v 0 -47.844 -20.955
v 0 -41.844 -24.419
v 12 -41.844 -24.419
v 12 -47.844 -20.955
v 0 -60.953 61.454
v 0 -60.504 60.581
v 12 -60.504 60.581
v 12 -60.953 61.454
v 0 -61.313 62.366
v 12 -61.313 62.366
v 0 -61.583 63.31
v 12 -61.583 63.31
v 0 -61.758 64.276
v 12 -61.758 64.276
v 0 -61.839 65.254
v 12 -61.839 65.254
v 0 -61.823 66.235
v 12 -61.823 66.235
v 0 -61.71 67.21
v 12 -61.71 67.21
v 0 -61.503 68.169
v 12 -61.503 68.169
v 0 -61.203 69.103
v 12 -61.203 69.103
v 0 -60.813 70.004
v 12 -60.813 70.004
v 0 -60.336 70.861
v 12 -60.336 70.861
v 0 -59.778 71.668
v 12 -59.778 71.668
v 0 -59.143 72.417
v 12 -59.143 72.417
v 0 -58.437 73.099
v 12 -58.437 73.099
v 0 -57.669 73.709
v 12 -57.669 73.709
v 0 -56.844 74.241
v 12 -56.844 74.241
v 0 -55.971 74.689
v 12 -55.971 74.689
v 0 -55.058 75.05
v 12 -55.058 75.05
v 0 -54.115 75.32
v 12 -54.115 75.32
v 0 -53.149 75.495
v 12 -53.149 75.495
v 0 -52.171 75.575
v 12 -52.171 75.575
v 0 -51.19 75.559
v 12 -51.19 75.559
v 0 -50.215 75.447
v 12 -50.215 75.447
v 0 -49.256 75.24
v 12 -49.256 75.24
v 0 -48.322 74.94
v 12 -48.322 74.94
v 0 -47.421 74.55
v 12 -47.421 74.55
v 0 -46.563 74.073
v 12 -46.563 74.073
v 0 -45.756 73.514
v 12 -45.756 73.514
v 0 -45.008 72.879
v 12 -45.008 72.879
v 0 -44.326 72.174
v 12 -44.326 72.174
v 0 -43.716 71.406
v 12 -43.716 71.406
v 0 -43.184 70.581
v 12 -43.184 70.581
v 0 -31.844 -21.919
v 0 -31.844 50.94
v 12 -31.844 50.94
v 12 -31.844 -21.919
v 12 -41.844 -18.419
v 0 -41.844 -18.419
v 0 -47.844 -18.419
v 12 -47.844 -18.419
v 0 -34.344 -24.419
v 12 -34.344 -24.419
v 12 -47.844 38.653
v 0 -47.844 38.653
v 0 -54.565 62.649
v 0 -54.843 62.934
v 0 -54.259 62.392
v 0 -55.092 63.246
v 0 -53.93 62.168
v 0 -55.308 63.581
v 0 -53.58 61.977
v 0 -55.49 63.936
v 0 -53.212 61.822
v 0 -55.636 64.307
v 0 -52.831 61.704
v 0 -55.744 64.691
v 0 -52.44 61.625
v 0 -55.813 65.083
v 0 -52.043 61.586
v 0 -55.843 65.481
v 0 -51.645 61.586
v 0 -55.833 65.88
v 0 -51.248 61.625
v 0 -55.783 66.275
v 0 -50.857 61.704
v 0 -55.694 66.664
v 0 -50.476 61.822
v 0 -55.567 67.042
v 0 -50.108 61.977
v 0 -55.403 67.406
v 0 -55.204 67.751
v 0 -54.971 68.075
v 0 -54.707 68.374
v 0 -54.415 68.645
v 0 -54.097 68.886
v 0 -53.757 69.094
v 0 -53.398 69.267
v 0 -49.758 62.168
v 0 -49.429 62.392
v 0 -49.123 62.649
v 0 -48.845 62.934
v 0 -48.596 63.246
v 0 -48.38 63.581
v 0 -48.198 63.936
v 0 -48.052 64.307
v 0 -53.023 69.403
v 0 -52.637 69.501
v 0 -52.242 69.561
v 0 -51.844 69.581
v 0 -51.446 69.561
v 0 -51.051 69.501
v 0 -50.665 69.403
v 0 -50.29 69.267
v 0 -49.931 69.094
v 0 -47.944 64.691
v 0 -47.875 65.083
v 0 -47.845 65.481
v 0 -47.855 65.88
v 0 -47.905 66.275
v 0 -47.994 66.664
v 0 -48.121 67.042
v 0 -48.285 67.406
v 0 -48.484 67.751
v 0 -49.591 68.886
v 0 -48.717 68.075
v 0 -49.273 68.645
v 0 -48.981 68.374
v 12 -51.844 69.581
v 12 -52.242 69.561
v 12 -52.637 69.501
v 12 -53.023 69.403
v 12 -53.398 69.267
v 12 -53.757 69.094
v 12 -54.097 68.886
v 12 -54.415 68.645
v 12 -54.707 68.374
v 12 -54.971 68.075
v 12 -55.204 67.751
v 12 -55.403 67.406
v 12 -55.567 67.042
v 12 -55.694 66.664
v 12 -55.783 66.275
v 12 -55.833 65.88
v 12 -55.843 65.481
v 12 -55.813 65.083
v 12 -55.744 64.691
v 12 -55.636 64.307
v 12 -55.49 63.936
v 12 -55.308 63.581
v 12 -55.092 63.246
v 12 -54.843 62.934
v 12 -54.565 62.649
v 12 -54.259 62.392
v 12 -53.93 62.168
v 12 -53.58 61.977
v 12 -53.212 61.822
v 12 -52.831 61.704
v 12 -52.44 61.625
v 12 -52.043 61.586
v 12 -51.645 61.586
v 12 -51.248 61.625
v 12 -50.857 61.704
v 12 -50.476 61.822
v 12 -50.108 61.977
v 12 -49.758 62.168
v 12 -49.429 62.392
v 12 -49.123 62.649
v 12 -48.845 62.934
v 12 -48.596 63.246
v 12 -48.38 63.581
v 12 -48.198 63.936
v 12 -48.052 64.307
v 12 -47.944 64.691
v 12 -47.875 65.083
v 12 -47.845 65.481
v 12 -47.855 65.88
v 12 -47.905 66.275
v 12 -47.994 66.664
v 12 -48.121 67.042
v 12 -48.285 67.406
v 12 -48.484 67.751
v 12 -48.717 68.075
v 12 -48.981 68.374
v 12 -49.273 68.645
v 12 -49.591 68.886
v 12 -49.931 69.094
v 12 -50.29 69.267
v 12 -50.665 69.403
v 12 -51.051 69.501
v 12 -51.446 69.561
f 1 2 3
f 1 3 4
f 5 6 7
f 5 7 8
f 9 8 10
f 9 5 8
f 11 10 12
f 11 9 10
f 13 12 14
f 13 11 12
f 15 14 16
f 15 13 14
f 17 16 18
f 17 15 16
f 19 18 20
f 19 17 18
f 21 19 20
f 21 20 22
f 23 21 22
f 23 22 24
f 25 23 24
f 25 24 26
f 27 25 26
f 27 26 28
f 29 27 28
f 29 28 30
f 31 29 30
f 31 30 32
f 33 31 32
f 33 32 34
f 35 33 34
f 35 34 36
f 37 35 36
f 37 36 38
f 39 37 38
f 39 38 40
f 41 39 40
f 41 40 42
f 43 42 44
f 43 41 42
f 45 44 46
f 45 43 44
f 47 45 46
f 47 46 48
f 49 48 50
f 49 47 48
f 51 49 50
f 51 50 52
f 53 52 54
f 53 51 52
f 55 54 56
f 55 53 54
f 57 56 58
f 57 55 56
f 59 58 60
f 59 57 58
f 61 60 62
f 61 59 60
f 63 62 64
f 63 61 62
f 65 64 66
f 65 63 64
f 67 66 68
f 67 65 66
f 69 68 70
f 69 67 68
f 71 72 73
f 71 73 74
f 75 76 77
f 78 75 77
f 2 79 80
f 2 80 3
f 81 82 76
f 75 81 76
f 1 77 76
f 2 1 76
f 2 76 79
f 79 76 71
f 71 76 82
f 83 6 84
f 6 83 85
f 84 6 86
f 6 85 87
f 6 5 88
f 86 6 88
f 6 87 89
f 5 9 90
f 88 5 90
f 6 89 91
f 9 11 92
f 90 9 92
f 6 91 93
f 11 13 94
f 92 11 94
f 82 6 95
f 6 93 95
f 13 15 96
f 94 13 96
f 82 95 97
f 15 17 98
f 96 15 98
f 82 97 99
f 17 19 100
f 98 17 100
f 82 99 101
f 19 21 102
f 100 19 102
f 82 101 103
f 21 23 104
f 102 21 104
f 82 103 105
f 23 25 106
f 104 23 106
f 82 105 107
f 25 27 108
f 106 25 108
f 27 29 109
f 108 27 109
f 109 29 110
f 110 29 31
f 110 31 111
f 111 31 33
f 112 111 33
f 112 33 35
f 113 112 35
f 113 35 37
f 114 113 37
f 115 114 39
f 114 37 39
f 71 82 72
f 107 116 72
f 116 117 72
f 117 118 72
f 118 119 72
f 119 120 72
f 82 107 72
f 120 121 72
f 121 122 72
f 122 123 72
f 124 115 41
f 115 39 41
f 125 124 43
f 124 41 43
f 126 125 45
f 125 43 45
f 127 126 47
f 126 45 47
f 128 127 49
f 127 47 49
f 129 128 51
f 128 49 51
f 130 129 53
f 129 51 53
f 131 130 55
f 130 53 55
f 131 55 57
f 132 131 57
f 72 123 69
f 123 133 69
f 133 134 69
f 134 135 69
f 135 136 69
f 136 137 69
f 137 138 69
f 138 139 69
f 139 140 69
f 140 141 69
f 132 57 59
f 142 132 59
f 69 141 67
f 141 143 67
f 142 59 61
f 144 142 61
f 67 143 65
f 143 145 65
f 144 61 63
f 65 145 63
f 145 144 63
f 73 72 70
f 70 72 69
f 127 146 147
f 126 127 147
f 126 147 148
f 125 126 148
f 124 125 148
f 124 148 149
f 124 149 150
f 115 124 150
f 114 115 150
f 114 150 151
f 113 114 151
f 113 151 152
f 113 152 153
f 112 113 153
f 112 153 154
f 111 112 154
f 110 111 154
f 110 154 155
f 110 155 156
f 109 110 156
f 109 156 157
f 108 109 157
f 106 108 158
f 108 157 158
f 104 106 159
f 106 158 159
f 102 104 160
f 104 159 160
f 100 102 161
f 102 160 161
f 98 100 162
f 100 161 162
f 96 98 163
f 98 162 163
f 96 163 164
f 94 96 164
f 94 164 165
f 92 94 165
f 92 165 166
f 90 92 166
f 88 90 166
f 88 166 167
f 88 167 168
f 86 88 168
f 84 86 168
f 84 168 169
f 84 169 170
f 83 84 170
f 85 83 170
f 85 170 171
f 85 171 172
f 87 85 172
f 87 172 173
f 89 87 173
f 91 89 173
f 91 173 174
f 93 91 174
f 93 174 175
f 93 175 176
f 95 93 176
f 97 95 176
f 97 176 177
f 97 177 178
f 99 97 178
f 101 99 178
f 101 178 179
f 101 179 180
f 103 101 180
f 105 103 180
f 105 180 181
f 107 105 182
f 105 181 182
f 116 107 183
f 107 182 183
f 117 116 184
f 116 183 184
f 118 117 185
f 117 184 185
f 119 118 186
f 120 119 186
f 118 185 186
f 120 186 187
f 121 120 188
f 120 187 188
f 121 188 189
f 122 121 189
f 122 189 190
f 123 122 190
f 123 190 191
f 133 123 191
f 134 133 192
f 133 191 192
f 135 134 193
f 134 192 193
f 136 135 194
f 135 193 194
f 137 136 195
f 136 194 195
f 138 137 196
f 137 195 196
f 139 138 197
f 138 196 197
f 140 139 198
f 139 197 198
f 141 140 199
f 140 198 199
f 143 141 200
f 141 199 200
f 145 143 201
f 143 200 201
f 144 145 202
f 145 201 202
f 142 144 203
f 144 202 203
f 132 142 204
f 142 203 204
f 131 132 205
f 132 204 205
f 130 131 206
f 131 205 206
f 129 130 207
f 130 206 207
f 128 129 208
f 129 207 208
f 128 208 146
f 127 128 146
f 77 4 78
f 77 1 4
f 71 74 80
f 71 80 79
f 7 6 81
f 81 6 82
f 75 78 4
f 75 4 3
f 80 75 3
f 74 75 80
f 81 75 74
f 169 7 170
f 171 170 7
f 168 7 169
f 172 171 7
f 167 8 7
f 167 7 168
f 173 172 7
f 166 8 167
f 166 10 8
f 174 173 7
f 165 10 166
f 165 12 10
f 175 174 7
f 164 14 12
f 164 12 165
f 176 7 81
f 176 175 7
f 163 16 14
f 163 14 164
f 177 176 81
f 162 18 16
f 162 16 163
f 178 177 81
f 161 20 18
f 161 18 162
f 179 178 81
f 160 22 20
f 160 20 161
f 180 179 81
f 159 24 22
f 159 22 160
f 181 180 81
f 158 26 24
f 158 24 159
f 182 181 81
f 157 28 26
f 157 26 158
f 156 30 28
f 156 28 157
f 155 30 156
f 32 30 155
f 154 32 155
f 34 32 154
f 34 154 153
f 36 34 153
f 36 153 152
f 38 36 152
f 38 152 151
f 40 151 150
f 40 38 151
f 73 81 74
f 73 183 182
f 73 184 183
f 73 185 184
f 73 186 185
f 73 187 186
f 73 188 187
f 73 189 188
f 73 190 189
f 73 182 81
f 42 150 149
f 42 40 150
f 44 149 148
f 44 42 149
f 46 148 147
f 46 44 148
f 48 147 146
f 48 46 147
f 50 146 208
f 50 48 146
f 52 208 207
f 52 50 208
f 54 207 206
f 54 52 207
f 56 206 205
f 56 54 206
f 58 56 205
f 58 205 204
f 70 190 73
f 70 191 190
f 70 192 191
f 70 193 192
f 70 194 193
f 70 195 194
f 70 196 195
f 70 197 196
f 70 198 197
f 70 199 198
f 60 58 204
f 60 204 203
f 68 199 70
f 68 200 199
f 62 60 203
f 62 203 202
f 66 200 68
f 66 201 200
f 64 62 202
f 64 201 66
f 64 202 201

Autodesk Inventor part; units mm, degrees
ref_plane "YZ Plane" through (0, 0, 0) normal (1, 0, 0) x (0, 1, 0)
ref_plane "XZ Plane" through (0, 0, 0) normal (0, 1, 0) x (-1, 0, 0)
ref_plane "XY Plane" through (0, 0, 0) normal (0, 0, 1) x (1, 0, 0)
sketch "Skizze1" plane through (0, 0, 0) normal (1, 0, 0) x (0, 1, 0)
  line L0 (-88.8183, 0) -> (21.3265, 0) projected
  line L1 (0, -72.4192) -> (0, 123.5808) projected
  line L2 (-61.844, -44.4192) -> (-61.844, 95.5808)
  line L3 (-31.844, 50.9398) -> (-31.844, -24.4192)
  line L4 (-41.844, -18.4192) -> (-47.844, -18.4192)
  line L5 (-41.844, -24.4192) -> (-47.844, -20.9551)
  line L6 (-41.844, -24.4192) -> (-34.9129, -24.4192) construction
  line L7 (-31.844, 50.9398) -> (-43.1838, 70.5808)
  line L8 (-31.844, 50.9398) -> (-5.6477, 50.9398) construction
  circle A0 centre (-51.844, 65.5808) radius 10
  line L9 (-60.5043, 60.5808) -> (-47.844, 38.6526)
  line L10 (-61.844, 62.7769) -> (-45.1591, 62.7769) construction
  line L11 (-47.844, 38.6526) -> (-41.844, -18.4192)
  line L12 (-31.844, -24.4192) -> (-41.844, -24.4192)
  line L13 (-47.844, -20.9551) -> (-47.844, -18.4192)
  line L14 (-73.0833, 75.5808) -> (5.5916, 75.5808)
  point P0 (0, 0)
  point P1 (-61.844, 75.5808)
  point P2 (-37.5139, 60.7603)
  dimension "d0" = 150
  dimension "d1" = 120
  dimension "d2" = 60
  dimension "d3" = 6
  dimension "d4" = 16
  dimension "d5" = 10
  dimension "d6" = 20
  dimension "d7" = 30
  dimension "d8" = 16
extrude "Extrusion1" add sketch "Skizze1" along normal blind 12 contours L11 L9 A0 L7 L3 L0 | L0 L3 L12 L5 L13 L4 L11 | A0
hole "Bohrung1" at (0, -51.844, 65.5808) direction (1, 0, 0) diameter 8 end through all
chamfer "Fasen1" distance 2.5 angle 45 1 edges at (6, -31.844, -24.4192) measured on face at (4, -38.5107, -24.4192)
properties part number "Abzieher_Klaue1" material "1.0038 S235JR"
